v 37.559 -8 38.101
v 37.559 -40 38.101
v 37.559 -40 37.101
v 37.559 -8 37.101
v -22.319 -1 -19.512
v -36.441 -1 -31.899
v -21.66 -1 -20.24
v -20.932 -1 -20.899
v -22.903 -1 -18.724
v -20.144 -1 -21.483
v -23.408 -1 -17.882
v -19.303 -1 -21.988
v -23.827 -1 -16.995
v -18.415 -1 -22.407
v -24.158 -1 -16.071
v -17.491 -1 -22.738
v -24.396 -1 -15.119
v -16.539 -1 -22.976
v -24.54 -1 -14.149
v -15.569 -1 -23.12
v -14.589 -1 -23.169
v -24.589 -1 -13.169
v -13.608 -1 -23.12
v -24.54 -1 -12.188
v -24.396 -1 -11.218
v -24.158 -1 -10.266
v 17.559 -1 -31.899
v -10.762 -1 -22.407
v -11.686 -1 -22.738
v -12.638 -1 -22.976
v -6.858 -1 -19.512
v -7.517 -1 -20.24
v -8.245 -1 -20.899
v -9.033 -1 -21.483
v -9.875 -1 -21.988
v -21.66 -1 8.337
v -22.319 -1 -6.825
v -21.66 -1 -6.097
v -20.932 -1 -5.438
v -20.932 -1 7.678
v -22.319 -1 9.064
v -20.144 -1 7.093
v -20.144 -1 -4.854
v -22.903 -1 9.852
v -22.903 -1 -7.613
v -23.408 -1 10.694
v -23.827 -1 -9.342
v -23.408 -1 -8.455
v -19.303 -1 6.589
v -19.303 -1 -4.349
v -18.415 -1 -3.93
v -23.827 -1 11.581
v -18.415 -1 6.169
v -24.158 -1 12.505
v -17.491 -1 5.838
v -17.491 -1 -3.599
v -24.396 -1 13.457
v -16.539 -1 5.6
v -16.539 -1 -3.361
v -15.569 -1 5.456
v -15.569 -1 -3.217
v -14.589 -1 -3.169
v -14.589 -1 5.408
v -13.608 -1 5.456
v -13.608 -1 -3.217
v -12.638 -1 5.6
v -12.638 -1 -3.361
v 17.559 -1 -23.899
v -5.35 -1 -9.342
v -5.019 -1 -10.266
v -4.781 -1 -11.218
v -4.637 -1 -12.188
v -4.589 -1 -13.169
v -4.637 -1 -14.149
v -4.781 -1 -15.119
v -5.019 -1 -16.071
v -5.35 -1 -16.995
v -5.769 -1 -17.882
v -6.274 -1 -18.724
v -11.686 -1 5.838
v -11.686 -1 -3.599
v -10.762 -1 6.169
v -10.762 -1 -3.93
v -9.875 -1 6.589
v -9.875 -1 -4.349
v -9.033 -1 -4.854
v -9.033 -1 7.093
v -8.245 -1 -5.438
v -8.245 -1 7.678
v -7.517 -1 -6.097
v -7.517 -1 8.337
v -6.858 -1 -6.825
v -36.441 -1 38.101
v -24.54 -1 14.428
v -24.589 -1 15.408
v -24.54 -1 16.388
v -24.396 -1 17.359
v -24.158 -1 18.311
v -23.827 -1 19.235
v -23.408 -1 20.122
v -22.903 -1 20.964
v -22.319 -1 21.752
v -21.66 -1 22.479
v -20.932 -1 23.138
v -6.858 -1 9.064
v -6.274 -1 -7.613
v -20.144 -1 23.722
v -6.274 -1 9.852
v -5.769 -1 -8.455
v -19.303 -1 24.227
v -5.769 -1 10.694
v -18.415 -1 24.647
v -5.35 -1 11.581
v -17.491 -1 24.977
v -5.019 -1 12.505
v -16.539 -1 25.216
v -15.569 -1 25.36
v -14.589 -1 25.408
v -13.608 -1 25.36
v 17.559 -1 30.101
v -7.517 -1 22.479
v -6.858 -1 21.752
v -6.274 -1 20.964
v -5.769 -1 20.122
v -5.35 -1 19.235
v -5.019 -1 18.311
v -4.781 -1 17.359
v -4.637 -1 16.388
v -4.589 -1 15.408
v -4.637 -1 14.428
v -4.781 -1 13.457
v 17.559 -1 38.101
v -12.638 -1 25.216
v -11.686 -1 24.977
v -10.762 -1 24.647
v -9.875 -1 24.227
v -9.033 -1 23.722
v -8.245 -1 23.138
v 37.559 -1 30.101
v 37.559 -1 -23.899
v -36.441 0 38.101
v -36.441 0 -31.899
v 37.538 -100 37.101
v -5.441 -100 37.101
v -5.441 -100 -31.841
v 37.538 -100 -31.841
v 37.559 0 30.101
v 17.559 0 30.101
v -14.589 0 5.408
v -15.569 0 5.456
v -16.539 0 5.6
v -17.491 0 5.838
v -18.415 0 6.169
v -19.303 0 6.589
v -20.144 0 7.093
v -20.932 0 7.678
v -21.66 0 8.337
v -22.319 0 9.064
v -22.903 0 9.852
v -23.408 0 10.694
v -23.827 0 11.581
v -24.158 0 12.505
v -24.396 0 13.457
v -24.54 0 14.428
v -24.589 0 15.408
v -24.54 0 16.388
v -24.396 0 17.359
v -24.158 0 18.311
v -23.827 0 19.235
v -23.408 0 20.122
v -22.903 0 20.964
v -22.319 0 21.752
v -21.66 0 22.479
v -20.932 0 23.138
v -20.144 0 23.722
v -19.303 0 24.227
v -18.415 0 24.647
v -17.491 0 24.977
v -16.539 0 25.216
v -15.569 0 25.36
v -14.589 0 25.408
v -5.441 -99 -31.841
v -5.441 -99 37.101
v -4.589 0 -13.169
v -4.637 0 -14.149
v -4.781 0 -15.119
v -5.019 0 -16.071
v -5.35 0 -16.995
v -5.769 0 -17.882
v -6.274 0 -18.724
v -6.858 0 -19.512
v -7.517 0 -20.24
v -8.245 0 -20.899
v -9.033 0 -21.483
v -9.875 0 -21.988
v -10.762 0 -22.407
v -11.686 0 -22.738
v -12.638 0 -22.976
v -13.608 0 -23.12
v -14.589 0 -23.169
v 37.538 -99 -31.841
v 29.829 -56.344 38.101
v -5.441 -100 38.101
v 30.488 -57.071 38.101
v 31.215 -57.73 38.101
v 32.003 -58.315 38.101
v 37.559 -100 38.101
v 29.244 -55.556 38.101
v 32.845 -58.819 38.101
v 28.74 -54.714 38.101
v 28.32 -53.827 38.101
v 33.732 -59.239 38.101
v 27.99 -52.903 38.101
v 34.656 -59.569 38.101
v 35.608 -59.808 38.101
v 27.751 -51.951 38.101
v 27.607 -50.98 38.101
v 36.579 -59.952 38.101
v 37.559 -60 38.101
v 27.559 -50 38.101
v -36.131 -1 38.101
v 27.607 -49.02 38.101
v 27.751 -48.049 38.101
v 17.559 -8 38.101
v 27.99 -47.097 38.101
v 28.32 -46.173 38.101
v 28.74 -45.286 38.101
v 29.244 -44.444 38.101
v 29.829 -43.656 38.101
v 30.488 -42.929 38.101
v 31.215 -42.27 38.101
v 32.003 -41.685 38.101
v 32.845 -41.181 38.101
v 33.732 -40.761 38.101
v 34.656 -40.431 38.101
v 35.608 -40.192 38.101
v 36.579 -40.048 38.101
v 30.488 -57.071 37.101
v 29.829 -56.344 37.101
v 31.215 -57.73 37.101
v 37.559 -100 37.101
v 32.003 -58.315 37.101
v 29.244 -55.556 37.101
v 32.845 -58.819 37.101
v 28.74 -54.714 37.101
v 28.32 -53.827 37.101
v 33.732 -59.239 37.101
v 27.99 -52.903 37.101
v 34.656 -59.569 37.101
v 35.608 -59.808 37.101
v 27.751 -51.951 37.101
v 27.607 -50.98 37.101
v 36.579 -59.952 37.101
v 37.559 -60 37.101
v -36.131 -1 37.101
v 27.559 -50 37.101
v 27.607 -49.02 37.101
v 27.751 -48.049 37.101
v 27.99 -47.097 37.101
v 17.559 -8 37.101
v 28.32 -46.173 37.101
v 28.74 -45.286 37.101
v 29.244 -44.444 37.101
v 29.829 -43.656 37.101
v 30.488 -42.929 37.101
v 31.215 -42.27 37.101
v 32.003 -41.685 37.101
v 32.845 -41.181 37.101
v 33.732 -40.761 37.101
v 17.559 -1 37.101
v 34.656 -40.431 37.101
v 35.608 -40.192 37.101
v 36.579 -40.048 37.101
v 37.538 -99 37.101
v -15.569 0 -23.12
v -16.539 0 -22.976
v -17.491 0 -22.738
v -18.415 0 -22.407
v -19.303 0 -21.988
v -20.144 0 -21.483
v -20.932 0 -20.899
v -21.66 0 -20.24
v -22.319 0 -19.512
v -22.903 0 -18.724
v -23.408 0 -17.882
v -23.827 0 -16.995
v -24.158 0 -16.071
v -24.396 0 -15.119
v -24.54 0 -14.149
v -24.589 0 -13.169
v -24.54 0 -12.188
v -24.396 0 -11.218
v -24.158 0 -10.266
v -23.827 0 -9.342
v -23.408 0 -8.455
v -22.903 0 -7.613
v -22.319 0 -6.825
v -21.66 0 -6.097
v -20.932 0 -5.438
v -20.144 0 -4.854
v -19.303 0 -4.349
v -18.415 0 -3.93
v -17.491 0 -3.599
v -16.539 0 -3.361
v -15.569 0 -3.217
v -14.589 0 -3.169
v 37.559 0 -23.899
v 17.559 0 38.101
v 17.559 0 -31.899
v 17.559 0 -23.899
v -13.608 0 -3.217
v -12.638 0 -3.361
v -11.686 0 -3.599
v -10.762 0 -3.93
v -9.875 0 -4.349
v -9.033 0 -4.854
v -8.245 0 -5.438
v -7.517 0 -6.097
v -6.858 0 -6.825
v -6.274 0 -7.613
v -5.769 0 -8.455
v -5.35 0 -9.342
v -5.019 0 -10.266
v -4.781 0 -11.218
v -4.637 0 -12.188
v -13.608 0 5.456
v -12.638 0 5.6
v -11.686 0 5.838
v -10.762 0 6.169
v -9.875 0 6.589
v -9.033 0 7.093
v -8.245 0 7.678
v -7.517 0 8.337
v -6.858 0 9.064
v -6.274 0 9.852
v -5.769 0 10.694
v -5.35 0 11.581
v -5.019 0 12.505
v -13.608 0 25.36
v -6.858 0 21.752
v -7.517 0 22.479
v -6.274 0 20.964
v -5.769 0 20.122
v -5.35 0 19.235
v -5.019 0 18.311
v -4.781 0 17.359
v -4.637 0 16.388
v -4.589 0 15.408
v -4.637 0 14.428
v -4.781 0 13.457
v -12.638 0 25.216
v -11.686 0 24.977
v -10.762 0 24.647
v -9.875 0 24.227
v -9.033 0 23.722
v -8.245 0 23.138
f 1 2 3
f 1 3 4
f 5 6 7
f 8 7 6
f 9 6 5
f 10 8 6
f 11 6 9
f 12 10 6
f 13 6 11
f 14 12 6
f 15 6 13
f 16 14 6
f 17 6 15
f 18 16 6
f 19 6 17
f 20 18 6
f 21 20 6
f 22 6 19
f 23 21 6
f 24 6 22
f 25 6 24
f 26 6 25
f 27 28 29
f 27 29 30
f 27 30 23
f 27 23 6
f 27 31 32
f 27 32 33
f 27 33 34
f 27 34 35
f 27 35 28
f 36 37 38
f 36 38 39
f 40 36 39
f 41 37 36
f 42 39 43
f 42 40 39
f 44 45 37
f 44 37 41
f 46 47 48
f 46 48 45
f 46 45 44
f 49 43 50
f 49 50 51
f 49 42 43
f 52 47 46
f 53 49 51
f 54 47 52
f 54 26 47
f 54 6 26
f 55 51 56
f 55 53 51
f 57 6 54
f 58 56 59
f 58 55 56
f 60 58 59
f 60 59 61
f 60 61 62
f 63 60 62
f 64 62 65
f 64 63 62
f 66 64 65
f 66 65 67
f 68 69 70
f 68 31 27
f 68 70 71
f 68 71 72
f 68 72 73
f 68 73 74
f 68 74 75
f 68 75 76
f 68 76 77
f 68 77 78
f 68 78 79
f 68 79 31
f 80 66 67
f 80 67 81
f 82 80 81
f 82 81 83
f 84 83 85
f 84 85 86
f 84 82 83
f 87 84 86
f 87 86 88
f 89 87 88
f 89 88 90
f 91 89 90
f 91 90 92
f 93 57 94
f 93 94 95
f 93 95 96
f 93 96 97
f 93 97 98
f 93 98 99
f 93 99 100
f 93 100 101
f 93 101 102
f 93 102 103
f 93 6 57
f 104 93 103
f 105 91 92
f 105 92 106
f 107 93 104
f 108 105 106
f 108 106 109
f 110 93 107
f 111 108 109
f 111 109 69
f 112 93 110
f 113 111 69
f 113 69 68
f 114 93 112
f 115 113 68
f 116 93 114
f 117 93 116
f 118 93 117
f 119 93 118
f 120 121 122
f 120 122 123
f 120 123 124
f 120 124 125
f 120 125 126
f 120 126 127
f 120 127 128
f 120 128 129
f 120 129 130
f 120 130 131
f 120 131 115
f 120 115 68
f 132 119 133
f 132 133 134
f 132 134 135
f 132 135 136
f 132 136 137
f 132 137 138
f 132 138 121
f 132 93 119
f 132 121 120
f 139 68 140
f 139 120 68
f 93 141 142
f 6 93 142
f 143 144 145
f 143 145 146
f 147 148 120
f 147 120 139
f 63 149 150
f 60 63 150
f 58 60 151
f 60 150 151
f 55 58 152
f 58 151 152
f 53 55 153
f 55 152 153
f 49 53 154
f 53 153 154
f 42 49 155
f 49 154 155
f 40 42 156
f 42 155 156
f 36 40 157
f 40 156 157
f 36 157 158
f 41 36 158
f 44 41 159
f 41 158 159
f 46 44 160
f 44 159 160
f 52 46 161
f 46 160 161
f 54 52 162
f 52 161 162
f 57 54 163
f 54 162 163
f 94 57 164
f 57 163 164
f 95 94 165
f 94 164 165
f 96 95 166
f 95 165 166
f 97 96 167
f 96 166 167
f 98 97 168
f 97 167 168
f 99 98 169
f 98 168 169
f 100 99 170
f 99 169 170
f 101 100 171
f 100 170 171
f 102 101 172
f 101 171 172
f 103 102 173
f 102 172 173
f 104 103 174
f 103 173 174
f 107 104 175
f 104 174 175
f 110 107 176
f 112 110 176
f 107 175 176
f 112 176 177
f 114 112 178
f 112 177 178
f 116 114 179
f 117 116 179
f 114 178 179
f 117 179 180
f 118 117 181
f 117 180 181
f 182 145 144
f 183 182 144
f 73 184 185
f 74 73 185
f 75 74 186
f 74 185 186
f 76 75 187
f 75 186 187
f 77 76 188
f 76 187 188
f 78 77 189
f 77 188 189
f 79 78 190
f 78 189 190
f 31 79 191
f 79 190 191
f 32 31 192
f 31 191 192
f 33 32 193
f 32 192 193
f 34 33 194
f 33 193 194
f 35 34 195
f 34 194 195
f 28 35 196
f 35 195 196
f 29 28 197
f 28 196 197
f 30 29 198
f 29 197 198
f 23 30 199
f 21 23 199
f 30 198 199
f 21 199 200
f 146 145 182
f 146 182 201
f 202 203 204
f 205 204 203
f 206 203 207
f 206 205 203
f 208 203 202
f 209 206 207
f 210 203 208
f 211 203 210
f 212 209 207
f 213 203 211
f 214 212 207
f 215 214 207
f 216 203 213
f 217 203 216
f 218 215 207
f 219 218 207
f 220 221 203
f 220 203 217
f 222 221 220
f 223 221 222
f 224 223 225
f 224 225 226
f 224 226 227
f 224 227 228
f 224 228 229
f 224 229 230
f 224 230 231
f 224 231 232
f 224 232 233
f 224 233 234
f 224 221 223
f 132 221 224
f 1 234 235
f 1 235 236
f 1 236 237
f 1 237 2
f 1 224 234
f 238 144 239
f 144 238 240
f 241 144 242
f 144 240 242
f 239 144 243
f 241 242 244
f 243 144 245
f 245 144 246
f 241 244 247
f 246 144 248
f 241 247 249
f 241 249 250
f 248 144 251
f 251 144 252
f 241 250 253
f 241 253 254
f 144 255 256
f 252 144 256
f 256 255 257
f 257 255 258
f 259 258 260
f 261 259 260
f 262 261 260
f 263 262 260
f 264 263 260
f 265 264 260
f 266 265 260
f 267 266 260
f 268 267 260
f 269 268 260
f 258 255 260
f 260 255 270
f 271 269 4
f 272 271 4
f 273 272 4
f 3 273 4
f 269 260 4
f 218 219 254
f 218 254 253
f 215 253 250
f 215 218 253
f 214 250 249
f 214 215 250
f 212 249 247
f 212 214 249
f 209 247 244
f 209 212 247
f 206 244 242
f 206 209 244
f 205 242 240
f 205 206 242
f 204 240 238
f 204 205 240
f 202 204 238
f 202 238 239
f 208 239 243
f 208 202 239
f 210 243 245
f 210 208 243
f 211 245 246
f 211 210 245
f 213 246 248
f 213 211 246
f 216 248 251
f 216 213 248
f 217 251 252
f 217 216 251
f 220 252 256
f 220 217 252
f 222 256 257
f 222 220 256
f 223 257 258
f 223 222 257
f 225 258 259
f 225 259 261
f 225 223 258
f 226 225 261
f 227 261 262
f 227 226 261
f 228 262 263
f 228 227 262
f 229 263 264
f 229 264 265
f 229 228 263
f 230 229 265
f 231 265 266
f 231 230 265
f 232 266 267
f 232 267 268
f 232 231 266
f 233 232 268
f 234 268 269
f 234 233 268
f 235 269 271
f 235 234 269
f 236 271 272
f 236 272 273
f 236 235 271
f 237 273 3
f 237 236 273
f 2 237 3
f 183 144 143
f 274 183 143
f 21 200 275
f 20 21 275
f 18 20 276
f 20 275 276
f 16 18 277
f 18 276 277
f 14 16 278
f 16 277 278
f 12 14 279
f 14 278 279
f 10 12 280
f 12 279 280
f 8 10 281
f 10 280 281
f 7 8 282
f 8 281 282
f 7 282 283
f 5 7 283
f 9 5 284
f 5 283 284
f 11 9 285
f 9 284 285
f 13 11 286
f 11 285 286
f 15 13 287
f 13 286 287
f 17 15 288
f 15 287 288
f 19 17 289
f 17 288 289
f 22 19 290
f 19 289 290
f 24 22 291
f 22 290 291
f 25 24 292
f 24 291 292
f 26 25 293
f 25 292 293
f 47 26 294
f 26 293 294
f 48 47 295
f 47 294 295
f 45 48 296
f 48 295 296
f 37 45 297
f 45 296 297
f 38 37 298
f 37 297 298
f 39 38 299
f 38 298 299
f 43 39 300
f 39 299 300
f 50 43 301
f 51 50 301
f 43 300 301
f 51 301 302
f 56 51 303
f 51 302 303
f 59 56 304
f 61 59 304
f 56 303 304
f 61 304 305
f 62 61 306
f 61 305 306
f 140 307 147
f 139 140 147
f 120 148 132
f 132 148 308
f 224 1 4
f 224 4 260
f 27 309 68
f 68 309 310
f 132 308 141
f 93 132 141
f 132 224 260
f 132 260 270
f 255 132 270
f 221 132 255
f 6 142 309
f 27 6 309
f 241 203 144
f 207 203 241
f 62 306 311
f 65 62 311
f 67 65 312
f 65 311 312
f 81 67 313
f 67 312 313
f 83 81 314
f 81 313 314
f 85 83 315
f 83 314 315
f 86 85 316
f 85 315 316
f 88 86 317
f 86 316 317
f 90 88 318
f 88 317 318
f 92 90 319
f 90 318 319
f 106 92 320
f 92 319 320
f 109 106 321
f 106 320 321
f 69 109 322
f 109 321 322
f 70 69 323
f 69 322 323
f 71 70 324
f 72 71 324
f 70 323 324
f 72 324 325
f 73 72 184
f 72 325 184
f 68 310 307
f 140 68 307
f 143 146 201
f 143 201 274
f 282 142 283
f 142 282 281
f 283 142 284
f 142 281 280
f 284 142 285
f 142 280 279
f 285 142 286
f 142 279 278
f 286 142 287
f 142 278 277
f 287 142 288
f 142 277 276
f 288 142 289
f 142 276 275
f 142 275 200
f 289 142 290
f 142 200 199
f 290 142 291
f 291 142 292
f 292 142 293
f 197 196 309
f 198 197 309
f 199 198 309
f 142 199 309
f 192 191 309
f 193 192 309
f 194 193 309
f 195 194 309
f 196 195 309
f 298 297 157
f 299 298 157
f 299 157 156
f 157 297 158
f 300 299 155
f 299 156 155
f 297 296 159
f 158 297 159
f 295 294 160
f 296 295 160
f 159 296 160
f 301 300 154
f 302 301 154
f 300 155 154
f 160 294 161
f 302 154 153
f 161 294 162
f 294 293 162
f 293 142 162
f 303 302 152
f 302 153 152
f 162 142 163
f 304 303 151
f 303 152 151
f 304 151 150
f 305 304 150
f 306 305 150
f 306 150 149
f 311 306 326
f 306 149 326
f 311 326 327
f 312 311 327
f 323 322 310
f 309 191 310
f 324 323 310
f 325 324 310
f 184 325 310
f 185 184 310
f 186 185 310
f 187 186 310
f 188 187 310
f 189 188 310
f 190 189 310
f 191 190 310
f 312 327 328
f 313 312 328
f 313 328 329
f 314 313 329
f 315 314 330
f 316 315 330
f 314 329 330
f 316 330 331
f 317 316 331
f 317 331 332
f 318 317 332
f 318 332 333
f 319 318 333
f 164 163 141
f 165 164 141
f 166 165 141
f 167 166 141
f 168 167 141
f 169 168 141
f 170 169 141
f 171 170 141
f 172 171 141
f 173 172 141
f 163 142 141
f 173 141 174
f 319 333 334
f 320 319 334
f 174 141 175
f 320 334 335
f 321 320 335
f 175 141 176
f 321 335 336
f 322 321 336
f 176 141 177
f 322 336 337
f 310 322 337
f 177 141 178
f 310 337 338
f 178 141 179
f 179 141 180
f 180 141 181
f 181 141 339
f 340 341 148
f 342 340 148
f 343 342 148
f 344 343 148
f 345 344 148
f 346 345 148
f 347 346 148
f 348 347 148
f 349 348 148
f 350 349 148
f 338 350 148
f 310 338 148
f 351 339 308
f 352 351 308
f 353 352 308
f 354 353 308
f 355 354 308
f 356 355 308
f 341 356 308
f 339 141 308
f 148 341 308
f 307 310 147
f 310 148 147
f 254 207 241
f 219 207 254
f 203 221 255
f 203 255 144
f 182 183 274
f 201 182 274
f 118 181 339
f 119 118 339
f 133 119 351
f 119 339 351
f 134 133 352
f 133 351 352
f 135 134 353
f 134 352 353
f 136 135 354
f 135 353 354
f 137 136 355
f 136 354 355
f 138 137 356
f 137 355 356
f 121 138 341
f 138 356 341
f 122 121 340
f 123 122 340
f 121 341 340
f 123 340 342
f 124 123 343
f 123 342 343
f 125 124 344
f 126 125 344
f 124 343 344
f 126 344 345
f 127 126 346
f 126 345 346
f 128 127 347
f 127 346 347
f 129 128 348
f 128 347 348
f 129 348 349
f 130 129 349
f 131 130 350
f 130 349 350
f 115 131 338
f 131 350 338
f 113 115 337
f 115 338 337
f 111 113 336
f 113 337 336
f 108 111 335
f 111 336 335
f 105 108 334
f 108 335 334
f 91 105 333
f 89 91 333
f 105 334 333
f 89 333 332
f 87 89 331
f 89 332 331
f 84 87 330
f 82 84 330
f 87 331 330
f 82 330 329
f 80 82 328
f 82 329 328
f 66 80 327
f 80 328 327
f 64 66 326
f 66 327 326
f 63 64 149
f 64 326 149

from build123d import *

# Parameters (mm, degrees)
F0_W     = 20
F0_H     = 54
F1_DEPTH = 1
F4_DEPTH = 1
F5_W     = 42.979176
F5_H     = 68.941915
F6_DEPTH = 1


with BuildPart() as f1:
    # F0 (on Front) → F1 (new body)
    with BuildSketch(Plane.XZ):
        with Locations((27.558972, 3.100805)):
            Rectangle(F0_W, F0_H)
        with BuildLine():
            Line((17.558972, -31.899195), (17.558972, -23.899195))
            Line((17.558972, -23.899195), (17.558972, 30.100805))
            Line((17.558972, 30.100805), (17.558972, 38.100805))
            Line((17.558972, 38.100805), (-14.588557, 38.100805))
            Line((-14.588557, 38.100805), (-14.588557, 25.407802))
            ThreePointArc((-14.588557, 25.407802), (-7.517489, 22.478869), (-4.588557, 15.407802))
            ThreePointArc((-4.588557, 15.407802), (-7.517489, 8.336734), (-14.588557, 5.407802))
            Line((-14.588557, 5.407802), (-14.588557, -3.168506))
            ThreePointArc((-14.588557, -3.168506), (-7.517489, -6.097439), (-4.588557, -13.168506))
            ThreePointArc((-4.588557, -13.168506), (-7.517489, -20.239574), (-14.588557, -23.168506))
            Line((-14.588557, -23.168506), (-14.588557, -31.899195))
            Line((-14.588557, -31.899195), (17.558972, -31.899195))
        make_face()
        with BuildLine():
            Line((-36.441028, -31.899195), (-14.588557, -31.899195))
            Line((-14.588557, -31.899195), (-14.588557, -23.168506))
            ThreePointArc((-14.588557, -23.168506), (-24.588557, -13.168506), (-14.588557, -3.168506))
            Line((-14.588557, -3.168506), (-14.588557, 5.407802))
            ThreePointArc((-14.588557, 5.407802), (-24.588557, 15.407802), (-14.588557, 25.407802))
            Line((-14.588557, 25.407802), (-14.588557, 38.100805))
            Line((-14.588557, 38.100805), (-36.441028, 38.100805))
            Line((-36.441028, 38.100805), (-36.441028, -31.899195))
        make_face()
    extrude(amount=F1_DEPTH)


with BuildPart() as f4:
    # F3 (on face) → F4 (new body)
    with BuildSketch(Plane.XY.offset(38.100805)):
        with BuildLine():
            Line((-36.131028, -1), (-5.441028, -100))
            Line((-5.441028, -100), (37.558972, -100))
            Line((37.558972, -100), (37.558972, -60))
            ThreePointArc((37.558972, -60), (27.558972, -50), (37.558972, -40))
            Line((37.558972, -40), (37.558972, -8))
            Line((37.558972, -8), (17.558972, -8))
            Line((17.558972, -8), (17.558972, -1))
            Line((17.558972, -1), (-36.131028, -1))
        make_face()
    extrude(amount=-F4_DEPTH)


with BuildPart() as f6:
    # F5 (on face) → F6 (new body)
    with BuildSketch(Plane.XZ.offset(100)):
        with Locations((16.04856, 2.629848)):
            Rectangle(F5_W, F5_H)
    extrude(amount=-F6_DEPTH)


solid = Compound([f1.part, f4.part, f6.part])
